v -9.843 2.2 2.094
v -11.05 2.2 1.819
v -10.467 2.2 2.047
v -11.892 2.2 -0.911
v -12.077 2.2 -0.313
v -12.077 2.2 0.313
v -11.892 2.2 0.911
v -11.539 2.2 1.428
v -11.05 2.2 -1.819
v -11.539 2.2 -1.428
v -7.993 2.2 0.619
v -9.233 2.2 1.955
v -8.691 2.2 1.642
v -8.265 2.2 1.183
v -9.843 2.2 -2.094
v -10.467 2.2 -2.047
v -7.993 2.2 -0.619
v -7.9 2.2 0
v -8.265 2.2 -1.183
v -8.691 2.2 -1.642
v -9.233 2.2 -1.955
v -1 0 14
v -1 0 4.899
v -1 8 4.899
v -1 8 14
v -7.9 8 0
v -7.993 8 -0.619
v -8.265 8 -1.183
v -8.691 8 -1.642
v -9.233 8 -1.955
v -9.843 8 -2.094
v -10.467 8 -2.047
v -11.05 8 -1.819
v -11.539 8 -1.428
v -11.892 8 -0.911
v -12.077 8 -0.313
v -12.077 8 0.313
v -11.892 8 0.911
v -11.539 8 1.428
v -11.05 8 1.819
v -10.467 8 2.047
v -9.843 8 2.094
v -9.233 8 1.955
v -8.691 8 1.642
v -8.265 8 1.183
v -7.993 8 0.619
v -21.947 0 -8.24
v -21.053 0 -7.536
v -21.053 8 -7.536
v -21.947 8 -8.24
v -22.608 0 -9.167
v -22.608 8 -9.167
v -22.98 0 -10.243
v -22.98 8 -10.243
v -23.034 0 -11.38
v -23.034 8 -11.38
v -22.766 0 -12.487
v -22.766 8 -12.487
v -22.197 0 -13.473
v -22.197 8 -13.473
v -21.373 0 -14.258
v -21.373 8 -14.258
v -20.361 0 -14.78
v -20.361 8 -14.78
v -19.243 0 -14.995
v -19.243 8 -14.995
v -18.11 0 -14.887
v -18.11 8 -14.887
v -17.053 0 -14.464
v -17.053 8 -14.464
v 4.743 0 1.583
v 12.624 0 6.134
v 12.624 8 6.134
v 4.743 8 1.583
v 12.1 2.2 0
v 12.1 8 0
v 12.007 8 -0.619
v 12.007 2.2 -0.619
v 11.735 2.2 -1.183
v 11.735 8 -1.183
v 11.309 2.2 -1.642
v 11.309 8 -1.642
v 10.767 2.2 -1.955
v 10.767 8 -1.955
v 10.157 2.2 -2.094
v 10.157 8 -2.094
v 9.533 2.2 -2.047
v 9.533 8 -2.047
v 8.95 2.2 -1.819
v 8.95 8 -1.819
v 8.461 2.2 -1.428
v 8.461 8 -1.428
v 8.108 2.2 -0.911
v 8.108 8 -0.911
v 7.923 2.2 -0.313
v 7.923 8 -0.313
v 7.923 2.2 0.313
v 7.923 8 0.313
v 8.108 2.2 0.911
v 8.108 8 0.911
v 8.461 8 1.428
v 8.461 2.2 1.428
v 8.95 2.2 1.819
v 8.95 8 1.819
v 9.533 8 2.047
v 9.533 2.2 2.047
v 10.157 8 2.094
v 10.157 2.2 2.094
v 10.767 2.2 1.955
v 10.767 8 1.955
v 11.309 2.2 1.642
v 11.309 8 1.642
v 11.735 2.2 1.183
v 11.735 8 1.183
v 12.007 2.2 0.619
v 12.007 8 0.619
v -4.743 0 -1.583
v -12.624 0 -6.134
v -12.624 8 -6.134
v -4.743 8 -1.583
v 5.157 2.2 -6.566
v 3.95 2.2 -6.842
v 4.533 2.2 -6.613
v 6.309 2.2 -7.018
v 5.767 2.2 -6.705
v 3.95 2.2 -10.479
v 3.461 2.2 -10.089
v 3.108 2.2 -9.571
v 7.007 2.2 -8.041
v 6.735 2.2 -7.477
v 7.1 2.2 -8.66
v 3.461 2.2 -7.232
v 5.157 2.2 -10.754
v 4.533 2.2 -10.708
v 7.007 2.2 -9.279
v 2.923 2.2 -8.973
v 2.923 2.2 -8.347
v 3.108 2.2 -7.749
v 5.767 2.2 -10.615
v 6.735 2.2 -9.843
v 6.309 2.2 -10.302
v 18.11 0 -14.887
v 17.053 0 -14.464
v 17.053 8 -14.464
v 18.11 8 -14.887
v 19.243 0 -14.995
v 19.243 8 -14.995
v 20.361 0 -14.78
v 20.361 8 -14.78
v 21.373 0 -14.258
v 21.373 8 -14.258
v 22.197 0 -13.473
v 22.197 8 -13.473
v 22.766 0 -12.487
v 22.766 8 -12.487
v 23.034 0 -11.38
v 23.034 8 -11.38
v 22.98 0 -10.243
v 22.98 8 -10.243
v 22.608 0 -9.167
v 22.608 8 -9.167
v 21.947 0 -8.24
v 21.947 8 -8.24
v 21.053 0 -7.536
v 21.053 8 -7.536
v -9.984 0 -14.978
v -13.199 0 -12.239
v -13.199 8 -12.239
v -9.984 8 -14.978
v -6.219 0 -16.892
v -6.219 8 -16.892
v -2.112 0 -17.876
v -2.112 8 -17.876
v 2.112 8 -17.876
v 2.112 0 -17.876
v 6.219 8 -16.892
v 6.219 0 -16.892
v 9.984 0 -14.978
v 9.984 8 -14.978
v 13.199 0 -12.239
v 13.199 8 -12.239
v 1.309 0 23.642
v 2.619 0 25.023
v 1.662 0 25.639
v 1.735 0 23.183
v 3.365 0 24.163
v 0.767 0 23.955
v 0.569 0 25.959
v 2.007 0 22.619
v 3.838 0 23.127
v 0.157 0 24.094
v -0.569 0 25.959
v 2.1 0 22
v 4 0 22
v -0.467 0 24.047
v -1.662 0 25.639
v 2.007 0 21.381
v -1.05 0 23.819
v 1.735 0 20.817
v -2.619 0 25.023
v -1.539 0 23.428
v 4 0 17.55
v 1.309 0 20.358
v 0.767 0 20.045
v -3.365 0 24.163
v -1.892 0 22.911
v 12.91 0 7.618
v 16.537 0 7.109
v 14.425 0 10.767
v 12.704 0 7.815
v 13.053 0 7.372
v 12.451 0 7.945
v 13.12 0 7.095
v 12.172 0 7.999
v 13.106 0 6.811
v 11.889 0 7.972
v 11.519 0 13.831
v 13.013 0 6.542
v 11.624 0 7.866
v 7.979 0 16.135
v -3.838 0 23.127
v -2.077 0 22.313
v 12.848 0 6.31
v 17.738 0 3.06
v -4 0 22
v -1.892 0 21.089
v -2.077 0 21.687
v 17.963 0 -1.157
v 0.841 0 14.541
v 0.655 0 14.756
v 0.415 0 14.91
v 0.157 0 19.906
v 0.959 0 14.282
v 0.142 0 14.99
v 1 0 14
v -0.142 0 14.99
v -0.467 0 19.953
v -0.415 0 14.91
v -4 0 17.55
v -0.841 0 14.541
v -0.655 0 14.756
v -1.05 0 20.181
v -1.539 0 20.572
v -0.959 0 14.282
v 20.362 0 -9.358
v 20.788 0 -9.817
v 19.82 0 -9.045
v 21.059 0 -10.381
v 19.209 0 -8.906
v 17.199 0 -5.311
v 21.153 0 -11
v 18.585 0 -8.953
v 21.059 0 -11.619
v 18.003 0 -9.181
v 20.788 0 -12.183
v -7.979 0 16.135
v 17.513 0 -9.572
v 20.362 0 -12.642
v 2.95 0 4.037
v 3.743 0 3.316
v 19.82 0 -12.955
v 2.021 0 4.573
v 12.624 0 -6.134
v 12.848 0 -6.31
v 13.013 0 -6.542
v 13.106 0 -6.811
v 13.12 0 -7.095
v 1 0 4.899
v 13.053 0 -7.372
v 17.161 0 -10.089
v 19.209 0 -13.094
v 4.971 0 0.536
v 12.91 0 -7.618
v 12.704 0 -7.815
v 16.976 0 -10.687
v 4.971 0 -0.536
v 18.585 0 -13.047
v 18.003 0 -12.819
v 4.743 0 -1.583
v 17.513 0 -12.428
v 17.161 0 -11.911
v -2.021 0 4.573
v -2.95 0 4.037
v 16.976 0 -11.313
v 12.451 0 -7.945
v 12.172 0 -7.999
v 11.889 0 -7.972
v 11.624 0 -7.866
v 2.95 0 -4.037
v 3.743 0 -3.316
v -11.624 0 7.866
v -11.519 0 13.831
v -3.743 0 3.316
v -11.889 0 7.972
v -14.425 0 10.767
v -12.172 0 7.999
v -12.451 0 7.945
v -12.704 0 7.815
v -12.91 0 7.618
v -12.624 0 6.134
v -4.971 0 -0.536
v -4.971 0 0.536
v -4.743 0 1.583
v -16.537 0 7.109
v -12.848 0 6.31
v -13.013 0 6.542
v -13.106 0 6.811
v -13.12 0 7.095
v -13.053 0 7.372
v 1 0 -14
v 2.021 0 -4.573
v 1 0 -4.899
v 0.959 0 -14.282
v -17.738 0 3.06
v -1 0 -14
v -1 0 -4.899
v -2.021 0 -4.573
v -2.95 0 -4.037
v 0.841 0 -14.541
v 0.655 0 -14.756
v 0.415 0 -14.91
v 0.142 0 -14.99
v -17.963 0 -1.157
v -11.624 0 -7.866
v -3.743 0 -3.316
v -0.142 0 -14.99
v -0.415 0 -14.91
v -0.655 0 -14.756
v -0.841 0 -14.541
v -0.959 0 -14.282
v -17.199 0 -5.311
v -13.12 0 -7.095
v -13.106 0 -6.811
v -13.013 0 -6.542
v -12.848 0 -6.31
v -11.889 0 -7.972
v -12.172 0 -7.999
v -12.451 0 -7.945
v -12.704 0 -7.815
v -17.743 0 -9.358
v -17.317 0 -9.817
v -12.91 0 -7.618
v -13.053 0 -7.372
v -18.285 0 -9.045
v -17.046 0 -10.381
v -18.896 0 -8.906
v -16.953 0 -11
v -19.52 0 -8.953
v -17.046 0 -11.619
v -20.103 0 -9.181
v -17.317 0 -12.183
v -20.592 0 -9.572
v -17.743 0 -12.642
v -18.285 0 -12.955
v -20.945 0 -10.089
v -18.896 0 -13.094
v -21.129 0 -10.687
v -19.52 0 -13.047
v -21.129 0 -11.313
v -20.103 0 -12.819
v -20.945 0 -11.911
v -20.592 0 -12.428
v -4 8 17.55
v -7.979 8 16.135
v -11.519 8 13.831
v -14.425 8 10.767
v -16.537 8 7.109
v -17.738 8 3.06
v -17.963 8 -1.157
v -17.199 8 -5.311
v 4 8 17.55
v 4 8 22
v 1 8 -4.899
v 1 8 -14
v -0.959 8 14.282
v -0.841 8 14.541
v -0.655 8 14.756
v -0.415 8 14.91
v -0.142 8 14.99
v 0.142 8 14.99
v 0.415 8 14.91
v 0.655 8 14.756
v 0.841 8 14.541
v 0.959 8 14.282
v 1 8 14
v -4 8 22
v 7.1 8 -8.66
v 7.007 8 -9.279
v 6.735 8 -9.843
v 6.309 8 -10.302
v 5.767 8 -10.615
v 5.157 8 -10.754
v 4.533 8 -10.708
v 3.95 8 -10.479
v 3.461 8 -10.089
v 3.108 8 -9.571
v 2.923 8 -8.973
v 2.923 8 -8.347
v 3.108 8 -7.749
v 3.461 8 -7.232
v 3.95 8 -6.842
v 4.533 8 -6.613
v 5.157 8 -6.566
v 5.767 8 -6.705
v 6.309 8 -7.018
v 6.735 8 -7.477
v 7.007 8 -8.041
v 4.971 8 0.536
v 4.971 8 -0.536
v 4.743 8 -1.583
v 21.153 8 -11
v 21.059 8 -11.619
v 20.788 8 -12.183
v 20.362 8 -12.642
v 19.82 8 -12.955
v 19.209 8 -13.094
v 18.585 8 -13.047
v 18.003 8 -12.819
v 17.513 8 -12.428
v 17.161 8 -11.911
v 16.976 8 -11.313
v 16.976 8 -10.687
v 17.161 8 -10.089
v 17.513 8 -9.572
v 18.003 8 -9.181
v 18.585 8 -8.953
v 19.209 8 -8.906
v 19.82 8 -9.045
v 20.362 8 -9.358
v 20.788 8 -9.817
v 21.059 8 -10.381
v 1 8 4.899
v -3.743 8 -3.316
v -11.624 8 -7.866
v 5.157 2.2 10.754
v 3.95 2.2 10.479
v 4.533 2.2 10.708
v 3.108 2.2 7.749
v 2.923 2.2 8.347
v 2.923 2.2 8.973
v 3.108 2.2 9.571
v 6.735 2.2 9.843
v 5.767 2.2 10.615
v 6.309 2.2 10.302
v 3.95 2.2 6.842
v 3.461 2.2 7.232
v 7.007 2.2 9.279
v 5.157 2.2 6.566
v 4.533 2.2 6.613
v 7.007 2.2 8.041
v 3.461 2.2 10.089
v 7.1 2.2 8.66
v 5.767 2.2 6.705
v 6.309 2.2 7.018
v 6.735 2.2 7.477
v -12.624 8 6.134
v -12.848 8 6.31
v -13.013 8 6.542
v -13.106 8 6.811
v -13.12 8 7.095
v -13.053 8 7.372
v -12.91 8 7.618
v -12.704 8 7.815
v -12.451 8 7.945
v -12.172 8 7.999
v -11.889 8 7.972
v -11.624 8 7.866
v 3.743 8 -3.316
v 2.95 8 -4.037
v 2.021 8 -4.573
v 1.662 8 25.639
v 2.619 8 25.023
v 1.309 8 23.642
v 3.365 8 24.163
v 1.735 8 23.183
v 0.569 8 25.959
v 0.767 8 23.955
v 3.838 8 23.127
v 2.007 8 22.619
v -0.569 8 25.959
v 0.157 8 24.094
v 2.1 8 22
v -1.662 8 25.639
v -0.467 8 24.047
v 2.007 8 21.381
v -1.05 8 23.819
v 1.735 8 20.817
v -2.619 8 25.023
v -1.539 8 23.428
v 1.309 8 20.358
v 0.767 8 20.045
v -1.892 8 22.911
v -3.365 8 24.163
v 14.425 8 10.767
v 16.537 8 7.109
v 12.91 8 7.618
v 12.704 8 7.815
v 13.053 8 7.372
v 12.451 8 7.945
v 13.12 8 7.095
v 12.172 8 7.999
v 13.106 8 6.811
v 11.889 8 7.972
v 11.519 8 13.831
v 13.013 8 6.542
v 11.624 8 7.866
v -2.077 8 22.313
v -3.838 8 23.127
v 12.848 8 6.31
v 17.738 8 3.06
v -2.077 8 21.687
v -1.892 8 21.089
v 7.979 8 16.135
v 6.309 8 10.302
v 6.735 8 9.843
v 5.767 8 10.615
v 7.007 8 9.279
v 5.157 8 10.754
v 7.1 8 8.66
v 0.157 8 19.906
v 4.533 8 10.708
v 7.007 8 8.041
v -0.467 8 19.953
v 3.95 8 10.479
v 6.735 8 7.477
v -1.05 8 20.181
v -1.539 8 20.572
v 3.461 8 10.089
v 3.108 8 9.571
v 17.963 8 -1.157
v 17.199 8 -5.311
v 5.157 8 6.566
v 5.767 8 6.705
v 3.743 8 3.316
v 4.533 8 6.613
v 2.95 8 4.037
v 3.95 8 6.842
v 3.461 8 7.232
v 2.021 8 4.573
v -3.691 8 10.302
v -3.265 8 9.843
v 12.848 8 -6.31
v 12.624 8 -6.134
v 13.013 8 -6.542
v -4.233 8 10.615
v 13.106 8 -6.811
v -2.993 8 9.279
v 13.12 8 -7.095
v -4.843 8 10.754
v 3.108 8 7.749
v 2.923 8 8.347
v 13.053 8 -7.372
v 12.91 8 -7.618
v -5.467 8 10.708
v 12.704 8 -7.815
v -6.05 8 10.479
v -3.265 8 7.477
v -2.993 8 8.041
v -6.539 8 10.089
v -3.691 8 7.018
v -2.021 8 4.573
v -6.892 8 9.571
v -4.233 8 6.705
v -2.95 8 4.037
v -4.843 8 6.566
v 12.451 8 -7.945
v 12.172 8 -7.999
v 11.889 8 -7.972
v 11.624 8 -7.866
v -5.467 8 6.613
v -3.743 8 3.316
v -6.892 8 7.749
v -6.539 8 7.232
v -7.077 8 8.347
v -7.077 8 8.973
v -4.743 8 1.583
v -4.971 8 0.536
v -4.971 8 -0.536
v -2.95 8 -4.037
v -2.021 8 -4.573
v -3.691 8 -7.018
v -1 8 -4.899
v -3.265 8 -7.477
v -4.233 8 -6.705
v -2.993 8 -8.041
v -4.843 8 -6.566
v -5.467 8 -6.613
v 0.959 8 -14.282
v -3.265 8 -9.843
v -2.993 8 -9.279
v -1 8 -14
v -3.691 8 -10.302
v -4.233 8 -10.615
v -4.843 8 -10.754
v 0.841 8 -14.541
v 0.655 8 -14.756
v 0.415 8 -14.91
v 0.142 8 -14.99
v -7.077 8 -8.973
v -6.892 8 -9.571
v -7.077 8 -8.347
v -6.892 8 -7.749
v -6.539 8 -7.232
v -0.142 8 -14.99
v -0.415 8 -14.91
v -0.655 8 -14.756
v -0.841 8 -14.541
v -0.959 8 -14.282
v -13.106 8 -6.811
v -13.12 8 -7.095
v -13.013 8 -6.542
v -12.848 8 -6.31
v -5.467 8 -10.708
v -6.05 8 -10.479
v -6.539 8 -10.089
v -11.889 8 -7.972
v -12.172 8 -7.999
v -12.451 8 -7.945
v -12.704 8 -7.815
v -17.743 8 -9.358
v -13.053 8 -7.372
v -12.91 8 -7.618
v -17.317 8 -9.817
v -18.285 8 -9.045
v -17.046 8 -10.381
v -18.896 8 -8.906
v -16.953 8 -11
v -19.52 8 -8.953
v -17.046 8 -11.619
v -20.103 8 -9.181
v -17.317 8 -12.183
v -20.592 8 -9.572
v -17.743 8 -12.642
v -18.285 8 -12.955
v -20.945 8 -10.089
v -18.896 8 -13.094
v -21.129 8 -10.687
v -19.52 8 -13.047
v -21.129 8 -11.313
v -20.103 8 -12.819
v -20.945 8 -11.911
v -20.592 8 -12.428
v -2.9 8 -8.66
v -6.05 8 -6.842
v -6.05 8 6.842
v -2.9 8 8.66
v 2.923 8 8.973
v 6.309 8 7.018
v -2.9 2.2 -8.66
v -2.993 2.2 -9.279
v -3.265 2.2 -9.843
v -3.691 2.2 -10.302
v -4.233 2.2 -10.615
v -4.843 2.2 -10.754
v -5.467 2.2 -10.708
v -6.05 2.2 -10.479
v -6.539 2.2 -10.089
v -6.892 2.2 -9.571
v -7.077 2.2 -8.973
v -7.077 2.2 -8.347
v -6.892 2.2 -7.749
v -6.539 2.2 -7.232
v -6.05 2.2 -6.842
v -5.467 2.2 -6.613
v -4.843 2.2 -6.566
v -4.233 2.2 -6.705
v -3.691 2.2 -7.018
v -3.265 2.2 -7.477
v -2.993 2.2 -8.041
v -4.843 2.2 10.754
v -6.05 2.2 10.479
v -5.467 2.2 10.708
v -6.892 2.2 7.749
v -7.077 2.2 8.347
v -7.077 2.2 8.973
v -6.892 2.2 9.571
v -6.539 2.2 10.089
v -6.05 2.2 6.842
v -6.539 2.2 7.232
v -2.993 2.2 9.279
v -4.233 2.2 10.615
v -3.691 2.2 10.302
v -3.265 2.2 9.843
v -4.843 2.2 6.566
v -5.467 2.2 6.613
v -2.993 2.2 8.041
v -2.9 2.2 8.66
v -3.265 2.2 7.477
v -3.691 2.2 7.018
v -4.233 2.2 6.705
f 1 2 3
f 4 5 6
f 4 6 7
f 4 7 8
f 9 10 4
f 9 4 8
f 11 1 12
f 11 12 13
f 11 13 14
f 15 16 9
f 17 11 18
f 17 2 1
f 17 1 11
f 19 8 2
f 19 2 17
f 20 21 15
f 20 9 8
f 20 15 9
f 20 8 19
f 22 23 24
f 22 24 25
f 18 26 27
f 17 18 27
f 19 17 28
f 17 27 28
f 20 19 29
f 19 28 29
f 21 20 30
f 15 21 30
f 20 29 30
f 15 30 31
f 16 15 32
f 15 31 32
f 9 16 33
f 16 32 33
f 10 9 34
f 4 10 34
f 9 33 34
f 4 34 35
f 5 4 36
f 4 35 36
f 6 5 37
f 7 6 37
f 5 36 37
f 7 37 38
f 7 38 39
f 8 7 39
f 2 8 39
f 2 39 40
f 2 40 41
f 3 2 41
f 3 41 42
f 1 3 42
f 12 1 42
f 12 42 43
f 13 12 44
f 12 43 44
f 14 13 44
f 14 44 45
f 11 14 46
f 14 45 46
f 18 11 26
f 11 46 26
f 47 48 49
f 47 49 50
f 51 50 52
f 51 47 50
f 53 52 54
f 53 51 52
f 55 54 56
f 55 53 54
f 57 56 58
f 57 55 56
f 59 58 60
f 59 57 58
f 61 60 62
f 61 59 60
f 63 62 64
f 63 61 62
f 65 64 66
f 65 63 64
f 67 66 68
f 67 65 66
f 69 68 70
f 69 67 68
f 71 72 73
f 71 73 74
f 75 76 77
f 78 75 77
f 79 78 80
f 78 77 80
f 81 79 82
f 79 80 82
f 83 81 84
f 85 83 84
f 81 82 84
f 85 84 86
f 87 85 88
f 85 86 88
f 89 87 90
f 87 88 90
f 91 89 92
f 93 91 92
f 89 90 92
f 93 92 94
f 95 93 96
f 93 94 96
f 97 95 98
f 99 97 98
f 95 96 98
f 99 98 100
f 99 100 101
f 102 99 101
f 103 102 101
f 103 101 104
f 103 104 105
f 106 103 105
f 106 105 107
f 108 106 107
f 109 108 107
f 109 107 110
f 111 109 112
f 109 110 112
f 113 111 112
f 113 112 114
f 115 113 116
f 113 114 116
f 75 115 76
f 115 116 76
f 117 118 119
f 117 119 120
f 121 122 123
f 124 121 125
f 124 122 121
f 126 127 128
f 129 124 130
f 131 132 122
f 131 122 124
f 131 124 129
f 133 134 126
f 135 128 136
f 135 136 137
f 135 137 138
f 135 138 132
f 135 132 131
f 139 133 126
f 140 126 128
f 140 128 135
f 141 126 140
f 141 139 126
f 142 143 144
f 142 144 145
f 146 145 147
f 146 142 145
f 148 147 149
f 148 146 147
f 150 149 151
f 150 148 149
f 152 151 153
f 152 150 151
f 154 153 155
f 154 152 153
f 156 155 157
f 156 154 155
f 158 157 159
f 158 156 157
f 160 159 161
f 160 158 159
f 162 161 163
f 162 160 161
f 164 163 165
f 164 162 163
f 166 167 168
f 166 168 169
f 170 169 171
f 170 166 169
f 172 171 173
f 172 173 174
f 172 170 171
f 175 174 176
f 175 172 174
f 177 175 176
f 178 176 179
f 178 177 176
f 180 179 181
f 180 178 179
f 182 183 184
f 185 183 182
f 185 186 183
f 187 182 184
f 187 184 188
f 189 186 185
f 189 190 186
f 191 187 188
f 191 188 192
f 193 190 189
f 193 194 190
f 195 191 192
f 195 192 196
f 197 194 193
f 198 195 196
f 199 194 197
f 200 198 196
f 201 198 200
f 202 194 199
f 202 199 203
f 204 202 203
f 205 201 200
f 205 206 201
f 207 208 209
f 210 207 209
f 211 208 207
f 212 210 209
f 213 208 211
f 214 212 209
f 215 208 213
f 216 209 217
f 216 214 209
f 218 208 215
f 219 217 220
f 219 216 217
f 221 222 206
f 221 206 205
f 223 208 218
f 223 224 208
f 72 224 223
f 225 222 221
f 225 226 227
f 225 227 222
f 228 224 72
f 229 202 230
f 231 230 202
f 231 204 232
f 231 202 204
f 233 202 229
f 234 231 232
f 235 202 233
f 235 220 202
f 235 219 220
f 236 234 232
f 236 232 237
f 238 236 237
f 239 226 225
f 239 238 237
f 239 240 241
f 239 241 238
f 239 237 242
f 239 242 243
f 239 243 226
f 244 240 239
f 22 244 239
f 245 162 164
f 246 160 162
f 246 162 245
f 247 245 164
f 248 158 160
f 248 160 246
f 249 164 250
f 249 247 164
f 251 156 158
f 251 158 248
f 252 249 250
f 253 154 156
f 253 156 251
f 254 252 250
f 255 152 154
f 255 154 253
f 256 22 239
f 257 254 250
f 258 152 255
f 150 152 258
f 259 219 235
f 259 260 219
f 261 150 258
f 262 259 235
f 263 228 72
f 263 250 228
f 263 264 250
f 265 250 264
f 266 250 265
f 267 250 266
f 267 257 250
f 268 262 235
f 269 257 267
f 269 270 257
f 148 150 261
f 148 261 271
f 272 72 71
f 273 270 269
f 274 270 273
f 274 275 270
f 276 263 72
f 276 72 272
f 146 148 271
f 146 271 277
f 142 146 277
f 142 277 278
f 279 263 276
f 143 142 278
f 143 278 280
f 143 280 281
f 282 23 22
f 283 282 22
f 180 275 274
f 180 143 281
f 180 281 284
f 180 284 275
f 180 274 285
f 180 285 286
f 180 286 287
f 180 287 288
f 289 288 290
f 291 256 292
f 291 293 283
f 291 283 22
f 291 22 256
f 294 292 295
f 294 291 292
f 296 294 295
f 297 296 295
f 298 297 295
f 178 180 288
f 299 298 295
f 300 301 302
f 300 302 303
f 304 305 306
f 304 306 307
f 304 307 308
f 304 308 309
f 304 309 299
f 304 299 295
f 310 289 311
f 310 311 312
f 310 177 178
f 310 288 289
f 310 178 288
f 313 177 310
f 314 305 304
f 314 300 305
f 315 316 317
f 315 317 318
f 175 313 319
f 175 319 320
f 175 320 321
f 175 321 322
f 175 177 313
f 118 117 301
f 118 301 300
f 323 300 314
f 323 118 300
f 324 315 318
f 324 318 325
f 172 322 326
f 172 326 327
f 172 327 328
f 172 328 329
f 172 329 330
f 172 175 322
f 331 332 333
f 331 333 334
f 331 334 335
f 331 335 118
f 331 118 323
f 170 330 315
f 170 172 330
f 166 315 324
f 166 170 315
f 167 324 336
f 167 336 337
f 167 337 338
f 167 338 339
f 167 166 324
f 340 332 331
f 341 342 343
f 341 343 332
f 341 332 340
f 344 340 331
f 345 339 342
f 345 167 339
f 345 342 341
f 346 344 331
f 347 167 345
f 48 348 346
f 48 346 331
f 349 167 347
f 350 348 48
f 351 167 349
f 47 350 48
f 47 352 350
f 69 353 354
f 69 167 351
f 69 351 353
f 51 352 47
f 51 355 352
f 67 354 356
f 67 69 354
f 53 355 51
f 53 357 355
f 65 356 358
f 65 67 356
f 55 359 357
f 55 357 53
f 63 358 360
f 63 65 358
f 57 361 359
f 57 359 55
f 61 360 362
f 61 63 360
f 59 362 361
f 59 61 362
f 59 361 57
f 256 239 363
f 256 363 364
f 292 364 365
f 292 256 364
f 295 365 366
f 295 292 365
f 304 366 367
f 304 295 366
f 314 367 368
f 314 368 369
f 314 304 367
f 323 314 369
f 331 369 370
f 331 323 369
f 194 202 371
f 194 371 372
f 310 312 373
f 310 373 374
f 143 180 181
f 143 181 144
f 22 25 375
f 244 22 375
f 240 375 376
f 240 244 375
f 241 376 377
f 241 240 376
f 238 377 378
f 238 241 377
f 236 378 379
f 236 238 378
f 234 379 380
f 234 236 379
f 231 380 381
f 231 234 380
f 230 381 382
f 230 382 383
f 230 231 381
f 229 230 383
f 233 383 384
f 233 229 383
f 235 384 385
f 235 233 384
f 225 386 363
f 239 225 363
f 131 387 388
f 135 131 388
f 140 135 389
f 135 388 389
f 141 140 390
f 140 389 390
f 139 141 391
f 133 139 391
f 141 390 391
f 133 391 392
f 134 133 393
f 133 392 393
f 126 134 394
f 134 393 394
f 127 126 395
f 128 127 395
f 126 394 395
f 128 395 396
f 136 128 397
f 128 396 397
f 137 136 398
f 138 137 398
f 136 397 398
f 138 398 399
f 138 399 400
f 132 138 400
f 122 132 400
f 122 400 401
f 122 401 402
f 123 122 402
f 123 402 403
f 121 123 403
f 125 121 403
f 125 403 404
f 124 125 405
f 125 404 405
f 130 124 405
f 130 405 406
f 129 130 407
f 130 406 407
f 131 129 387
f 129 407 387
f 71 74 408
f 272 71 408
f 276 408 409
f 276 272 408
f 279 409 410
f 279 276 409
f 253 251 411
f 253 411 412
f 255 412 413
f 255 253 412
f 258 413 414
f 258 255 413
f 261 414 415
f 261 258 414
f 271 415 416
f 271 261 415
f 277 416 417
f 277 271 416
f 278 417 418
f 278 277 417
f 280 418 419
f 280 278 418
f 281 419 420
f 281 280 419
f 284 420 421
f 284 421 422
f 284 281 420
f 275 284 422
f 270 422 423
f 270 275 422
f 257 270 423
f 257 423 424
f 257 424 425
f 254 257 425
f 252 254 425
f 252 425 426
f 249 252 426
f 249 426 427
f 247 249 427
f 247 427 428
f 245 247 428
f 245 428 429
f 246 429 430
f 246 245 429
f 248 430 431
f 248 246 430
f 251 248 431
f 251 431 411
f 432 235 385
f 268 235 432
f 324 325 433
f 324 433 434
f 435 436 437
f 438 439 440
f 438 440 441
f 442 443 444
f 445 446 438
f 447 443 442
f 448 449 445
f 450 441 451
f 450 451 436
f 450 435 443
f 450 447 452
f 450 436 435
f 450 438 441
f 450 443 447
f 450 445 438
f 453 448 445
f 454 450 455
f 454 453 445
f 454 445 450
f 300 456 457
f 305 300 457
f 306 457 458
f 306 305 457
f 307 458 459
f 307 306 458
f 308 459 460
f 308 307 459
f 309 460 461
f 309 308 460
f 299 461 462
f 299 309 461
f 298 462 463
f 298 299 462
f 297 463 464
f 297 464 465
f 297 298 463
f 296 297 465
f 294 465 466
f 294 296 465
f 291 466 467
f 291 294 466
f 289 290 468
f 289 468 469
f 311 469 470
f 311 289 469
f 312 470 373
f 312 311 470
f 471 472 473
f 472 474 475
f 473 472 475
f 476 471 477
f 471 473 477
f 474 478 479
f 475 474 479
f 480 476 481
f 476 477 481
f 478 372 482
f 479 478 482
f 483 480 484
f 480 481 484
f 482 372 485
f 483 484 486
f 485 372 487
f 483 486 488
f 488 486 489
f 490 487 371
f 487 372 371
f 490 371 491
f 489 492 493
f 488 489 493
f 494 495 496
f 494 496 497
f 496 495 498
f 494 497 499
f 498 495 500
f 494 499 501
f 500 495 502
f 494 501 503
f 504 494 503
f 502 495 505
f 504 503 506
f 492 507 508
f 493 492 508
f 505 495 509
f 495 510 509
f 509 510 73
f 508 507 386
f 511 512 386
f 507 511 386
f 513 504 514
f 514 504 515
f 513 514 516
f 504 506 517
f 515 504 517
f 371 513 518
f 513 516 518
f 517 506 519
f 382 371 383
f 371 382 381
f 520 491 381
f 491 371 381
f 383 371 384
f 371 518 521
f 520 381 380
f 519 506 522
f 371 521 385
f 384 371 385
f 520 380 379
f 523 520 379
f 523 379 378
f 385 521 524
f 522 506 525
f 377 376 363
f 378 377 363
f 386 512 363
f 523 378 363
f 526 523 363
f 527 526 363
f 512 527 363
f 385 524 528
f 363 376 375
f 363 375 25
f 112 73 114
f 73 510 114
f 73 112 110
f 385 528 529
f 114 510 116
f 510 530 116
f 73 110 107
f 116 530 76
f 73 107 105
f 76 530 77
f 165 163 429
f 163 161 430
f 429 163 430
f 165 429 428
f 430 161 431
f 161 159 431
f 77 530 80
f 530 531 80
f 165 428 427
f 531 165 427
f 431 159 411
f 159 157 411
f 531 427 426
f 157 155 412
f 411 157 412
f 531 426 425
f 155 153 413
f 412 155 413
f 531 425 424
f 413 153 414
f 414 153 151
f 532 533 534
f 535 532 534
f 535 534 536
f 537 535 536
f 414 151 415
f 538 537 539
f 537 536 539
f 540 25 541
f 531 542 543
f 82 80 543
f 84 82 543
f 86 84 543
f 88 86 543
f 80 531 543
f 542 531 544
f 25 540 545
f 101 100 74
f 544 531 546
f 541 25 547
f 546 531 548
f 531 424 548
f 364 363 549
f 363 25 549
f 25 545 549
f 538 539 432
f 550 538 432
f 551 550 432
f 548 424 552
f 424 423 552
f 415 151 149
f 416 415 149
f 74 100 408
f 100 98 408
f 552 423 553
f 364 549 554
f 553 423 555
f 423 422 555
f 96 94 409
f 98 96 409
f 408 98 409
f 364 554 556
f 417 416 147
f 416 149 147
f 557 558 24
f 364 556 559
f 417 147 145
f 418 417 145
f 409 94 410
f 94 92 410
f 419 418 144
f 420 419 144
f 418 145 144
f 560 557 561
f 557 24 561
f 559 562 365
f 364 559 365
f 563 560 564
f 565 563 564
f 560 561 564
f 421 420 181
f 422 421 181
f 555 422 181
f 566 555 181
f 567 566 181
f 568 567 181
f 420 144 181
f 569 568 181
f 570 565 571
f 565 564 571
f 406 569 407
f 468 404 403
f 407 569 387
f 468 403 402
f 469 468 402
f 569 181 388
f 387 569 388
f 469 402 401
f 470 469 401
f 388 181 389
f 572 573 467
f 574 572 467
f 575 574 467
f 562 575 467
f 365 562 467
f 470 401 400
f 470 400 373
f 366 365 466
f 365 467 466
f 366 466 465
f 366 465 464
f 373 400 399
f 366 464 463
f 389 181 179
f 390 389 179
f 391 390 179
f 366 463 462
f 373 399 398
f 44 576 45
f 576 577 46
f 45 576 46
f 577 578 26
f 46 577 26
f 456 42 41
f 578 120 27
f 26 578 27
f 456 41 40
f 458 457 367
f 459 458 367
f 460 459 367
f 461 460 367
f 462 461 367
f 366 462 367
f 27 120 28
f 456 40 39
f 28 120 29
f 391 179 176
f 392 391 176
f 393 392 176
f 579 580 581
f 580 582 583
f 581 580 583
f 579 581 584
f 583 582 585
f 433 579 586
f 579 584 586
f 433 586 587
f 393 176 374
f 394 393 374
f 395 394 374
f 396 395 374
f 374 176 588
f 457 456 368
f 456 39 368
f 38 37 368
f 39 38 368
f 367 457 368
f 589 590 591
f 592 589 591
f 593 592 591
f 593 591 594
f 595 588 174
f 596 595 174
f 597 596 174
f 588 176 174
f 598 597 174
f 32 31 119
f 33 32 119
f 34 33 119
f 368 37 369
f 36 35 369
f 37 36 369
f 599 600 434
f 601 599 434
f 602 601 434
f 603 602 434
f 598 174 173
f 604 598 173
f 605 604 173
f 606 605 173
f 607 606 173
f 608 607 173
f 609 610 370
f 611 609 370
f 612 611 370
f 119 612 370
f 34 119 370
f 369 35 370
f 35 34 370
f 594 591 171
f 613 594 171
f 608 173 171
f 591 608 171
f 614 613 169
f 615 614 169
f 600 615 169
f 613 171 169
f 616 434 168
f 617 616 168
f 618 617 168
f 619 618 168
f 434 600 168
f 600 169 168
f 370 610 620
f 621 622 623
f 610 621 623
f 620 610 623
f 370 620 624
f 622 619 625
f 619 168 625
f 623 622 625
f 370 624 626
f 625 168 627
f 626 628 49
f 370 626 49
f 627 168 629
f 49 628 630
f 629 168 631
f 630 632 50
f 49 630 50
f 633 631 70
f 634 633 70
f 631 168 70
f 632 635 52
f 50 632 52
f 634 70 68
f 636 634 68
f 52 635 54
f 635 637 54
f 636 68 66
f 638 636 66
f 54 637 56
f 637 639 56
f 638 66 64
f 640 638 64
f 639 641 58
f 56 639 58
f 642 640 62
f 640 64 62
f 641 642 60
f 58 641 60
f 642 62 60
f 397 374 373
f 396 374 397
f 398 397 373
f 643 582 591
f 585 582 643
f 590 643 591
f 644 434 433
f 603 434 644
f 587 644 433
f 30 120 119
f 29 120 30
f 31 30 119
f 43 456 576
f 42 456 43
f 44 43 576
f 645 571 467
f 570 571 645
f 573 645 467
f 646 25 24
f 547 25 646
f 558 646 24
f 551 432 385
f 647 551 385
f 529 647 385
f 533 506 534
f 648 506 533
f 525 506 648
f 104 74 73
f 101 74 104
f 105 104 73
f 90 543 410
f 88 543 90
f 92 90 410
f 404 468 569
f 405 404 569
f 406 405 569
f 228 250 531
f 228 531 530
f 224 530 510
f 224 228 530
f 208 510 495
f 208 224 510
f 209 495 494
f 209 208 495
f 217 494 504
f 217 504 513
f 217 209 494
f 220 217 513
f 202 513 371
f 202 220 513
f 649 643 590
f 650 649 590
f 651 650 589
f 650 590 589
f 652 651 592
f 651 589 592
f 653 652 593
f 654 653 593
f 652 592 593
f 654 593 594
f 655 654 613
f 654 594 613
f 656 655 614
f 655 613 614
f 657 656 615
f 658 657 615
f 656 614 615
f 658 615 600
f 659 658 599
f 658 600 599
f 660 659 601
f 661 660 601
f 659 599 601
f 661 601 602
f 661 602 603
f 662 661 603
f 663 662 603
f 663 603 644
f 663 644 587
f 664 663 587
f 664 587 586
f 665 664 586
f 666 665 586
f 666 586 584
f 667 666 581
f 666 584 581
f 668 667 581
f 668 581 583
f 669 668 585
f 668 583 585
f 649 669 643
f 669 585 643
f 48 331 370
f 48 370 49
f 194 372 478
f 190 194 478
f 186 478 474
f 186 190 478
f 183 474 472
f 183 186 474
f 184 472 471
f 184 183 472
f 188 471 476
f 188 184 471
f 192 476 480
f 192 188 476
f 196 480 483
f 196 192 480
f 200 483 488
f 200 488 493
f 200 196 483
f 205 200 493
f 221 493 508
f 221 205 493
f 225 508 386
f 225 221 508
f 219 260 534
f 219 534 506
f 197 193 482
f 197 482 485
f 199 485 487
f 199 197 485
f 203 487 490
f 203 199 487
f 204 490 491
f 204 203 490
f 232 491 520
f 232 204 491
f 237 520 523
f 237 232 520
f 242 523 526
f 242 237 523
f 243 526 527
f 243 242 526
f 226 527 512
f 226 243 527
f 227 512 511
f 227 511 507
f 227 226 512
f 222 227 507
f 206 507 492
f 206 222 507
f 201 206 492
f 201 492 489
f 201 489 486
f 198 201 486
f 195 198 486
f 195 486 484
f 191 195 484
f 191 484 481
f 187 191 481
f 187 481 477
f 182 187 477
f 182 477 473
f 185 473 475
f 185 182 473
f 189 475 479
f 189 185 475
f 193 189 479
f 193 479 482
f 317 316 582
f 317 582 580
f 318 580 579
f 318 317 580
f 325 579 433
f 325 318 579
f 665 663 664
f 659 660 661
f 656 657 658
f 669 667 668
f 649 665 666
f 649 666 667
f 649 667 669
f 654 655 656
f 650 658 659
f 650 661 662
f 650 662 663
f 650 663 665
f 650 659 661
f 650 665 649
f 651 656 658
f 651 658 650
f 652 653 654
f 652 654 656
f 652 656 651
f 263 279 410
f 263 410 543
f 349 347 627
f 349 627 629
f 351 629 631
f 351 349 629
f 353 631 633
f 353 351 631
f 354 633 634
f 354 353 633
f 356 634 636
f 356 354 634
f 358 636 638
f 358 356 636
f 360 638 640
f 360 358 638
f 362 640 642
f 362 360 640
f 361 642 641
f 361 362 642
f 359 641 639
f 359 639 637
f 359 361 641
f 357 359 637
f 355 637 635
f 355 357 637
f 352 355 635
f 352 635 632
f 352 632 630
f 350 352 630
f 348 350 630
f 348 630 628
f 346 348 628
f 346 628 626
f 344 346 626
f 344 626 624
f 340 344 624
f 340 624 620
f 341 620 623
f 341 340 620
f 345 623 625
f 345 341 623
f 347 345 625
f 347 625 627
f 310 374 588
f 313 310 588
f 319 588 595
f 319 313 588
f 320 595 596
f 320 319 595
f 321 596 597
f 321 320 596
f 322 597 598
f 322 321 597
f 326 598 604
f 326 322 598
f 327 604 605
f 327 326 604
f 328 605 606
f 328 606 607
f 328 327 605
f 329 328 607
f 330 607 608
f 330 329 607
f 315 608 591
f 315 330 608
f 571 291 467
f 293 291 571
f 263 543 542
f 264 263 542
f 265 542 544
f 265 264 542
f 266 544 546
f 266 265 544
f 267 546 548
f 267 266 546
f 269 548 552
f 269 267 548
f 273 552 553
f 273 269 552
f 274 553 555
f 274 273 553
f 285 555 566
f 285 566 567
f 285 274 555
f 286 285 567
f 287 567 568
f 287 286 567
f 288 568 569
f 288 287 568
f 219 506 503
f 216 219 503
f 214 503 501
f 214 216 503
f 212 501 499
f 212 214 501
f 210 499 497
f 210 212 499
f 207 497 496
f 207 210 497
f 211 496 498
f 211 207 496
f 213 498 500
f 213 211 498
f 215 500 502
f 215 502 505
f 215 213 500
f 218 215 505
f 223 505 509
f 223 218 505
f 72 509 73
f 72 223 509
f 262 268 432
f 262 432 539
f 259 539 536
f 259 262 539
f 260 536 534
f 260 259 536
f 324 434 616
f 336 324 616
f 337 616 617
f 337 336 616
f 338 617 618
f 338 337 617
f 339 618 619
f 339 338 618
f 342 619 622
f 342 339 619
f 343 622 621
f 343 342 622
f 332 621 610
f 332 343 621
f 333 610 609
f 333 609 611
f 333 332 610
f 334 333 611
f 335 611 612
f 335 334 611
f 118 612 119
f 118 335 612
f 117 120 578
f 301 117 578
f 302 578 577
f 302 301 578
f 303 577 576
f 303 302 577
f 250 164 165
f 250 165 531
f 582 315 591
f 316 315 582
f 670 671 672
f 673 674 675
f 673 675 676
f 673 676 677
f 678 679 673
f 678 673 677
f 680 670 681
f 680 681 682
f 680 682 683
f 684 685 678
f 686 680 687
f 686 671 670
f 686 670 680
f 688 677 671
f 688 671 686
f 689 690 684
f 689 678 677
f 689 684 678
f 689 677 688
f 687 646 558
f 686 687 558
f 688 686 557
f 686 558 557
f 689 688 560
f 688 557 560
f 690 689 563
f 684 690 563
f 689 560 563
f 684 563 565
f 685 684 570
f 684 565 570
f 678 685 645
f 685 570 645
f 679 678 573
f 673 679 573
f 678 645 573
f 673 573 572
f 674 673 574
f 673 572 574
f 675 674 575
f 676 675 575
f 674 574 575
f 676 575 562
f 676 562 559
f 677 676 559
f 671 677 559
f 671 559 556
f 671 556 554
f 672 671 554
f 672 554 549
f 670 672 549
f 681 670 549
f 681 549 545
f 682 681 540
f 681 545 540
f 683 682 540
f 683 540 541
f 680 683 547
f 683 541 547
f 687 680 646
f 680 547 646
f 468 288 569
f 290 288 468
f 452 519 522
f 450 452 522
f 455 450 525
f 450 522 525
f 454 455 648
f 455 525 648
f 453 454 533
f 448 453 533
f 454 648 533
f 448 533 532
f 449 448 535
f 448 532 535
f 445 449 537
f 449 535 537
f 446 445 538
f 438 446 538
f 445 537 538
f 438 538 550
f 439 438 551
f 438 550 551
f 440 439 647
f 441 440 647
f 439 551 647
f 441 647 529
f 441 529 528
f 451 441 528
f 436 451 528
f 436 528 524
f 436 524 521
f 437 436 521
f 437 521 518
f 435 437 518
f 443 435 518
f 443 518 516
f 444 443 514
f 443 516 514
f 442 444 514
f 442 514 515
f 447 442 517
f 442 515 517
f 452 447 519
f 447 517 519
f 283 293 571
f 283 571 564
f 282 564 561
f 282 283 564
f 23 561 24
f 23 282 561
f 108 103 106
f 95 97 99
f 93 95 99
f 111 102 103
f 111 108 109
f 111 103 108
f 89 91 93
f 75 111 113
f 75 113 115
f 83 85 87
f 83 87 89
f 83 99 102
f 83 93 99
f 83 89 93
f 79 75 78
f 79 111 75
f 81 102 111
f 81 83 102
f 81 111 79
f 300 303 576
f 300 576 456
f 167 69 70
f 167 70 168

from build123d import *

# Parameters (mm, degrees)
SKETCH1_R           = 2.1
BOSS_EXTRUDE1_DEPTH = 8
SKETCH2_R           = 2.1
CUT_EXTRUDE1_DEPTH  = 5.8


with BuildPart() as part:
    # Sketch1 → Boss-Extrude1 (new body)
    with BuildSketch(Plane(origin=(0, 0, 0), x_dir=(1, 0, 0), z_dir=(0, 1, 0))):
        with BuildLine():
            Line((-4, -22), (-4, -17.549928775))
            ThreePointArc((-4, -17.549928775), (-15.588457268, -9), (-17.198684154, 5.310862772))
            Line((-17.198684154, 5.310862772), (-21.052558883, 7.535898385))
            ThreePointArc((-21.052558883, 7.535898385), (-22.516660498, 13), (-17.052558883, 14.464101615))
            Line((-17.052558883, 14.464101615), (-13.198684154, 12.239066003))
            ThreePointArc((-13.198684154, 12.239066003), (0, 18), (13.198684154, 12.239066003))
            Line((13.198684154, 12.239066003), (17.052558883, 14.464101615))
            ThreePointArc((17.052558883, 14.464101615), (22.516660498, 13), (21.052558883, 7.535898385))
            Line((21.052558883, 7.535898385), (17.198684154, 5.310862772))
            ThreePointArc((17.198684154, 5.310862772), (15.588457268, -9), (4, -17.549928775))
            Line((4, -17.549928775), (4, -22))
            ThreePointArc((4, -22), (0, -26), (-4, -22))
        make_face()
        with Locations((0, -22)):
            Circle(SKETCH1_R, mode=Mode.SUBTRACT)
        with Locations((-19.052558883, 11)):
            Circle(SKETCH1_R, mode=Mode.SUBTRACT)
        with Locations((19.052558883, 11)):
            Circle(SKETCH1_R, mode=Mode.SUBTRACT)
        with BuildLine():
            Line((1, 4.898979486), (1, 14))
            ThreePointArc((1, 14), (0, 15), (-1, 14))
            Line((-1, 14), (-1, 4.898979486))
            ThreePointArc((-1, 4.898979486), (-2.5, 4.330127019), (-3.742640687, 3.315515147))
            Line((-3.742640687, 3.315515147), (-11.624355653, 7.866025404))
            ThreePointArc((-11.624355653, 7.866025404), (-12.990381057, 7.5), (-12.624355653, 6.133974596))
            Line((-12.624355653, 6.133974596), (-4.742640687, 1.583464339))
            ThreePointArc((-4.742640687, 1.583464339), (-5, 0), (-4.742640687, -1.583464339))
            Line((-4.742640687, -1.583464339), (-12.624355653, -6.133974596))
            ThreePointArc((-12.624355653, -6.133974596), (-12.990381057, -7.5), (-11.624355653, -7.866025404))
            Line((-11.624355653, -7.866025404), (-3.742640687, -3.315515147))
            ThreePointArc((-3.742640687, -3.315515147), (-2.5, -4.330127019), (-1, -4.898979486))
            Line((-1, -4.898979486), (-1, -14))
            ThreePointArc((-1, -14), (0, -15), (1, -14))
            Line((1, -14), (1, -4.898979486))
            ThreePointArc((1, -4.898979486), (2.5, -4.330127019), (3.742640687, -3.315515147))
            Line((3.742640687, -3.315515147), (11.624355653, -7.866025404))
            ThreePointArc((11.624355653, -7.866025404), (12.990381057, -7.5), (12.624355653, -6.133974596))
            Line((12.624355653, -6.133974596), (4.742640687, -1.583464339))
            ThreePointArc((4.742640687, -1.583464339), (5, 0), (4.742640687, 1.583464339))
            Line((4.742640687, 1.583464339), (12.624355653, 6.133974596))
            ThreePointArc((12.624355653, 6.133974596), (12.990381057, 7.5), (11.624355653, 7.866025404))
            Line((11.624355653, 7.866025404), (3.742640687, 3.315515147))
            ThreePointArc((3.742640687, 3.315515147), (2.5, 4.330127019), (1, 4.898979486))
        make_face(mode=Mode.SUBTRACT)
    extrude(amount=BOSS_EXTRUDE1_DEPTH)

    # Sketch2 → Cut-Extrude1 (cut)
    with BuildSketch(Plane(origin=(0, 8, 0), x_dir=(1, 0, 0), z_dir=(0, 1, 0))):
        with Locations((10, 0)):
            Circle(SKETCH2_R)
        with Locations((5, -8.660254038)):
            Circle(SKETCH2_R)
        with Locations((-5, -8.660254038)):
            Circle(SKETCH2_R)
        with Locations((-10, 0)):
            Circle(SKETCH2_R)
        with Locations((-5, 8.660254038)):
            Circle(SKETCH2_R)
        with Locations((5, 8.660254038)):
            Circle(SKETCH2_R)
    extrude(amount=-CUT_EXTRUDE1_DEPTH, mode=Mode.SUBTRACT)


solid = part.part
